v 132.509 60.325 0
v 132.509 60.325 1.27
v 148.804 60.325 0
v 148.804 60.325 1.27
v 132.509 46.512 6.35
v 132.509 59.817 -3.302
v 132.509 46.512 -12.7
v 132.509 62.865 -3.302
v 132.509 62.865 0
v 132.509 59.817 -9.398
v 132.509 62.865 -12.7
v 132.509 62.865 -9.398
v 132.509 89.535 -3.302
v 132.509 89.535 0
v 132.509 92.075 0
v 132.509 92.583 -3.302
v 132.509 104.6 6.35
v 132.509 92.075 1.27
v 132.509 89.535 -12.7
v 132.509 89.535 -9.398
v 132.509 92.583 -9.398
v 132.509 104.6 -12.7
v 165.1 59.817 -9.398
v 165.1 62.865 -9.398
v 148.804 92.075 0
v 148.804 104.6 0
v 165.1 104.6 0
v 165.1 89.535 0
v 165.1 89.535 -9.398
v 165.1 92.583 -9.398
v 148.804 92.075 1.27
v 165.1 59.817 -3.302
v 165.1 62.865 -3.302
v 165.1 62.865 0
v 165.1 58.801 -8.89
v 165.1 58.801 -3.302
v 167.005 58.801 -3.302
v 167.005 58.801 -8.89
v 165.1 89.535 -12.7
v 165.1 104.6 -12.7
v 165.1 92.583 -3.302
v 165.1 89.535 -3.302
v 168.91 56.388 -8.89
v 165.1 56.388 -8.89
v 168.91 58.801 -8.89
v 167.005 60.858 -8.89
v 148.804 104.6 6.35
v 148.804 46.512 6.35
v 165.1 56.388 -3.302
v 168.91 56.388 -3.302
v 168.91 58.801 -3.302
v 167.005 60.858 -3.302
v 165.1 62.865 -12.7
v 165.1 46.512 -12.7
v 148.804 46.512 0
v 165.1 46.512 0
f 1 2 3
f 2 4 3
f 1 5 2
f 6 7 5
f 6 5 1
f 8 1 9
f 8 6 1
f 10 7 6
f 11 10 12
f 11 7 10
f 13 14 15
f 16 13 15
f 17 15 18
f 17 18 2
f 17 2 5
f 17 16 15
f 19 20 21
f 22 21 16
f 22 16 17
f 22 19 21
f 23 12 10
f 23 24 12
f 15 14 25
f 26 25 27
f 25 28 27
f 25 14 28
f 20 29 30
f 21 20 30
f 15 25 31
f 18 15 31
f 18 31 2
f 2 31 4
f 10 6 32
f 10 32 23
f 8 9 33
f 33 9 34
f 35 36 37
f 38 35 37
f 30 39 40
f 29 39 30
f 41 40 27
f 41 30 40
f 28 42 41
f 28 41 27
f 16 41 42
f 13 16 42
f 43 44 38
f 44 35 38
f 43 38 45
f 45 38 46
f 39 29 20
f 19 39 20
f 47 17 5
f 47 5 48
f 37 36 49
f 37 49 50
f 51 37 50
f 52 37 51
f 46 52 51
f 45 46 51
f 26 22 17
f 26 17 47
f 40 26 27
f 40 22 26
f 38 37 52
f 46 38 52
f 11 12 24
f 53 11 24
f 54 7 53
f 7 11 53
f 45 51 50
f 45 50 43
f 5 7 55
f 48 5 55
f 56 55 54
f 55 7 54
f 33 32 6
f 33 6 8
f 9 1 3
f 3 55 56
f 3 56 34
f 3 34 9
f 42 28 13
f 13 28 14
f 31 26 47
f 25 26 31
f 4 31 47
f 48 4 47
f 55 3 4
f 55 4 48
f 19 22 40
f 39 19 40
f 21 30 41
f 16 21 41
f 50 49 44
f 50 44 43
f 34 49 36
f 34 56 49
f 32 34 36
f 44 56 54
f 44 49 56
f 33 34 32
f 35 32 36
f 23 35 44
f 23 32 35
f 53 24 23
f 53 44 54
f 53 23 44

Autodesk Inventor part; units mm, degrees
ref_plane "YZ Plane" through (0, 0, 0) normal (1, 0, 0) x (0, 1, 0)
ref_plane "XZ Plane" through (0, 0, 0) normal (0, 1, 0) x (-1, 0, 0)
sketch "Sketch1" plane through (0, 0, 0) normal (1, 0, 0) x (0, 1, 0)
  line L0 (0, 0) -> (228.6, 0)
  line L1 (228.6, 0) -> (228.6, -424.18)
  line L2 (228.6, -424.18) -> (0, -424.18)
  line L3 (0, -424.18) -> (0, 0)
  point P0 (0, 0)
  dimension "d0" = 424.18
  dimension "d1" = 228.6
extrude "Extrusion1" add sketch "Sketch1" along normal blind 165.1
sketch "Sketch2" plane through (165.1, 0, 0) normal (1, 0, 0) x (0, 0, -1)
  line L0 (0, 0) -> (424.18, 0) construction
  line L1 (12.7, 0) -> (411.48, 0)
  line L2 (411.48, 0) -> (411.48, 165.1)
  line L3 (411.48, 165.1) -> (12.7, 165.1)
  line L4 (12.7, 165.1) -> (12.7, 0)
  line L5 (0, 228.6) -> (0, 0) construction
  line L6 (424.18, 0) -> (424.18, 228.6) construction
  dimension "d4" = 398.78
  dimension "d5" = 165.1
  dimension "d6" = 12.7
  dimension "d7" = 12.7
extrude "Extrusion2" cut sketch "Sketch2" against normal blind 148.59
sketch "Sketch3" plane through (0, 0, 0) normal (0, 0, 1) x (1, 0, 0)
  line L0 (165.1, 228.6) -> (165.1, 0) projected
  line L1 (165.1, 89.535) -> (82.55, 89.535)
  line L2 (69.215, 89.535) -> (69.215, 62.865) construction
  line L3 (82.55, 62.865) -> (165.1, 62.865)
  line L4 (165.1, 62.865) -> (165.1, 89.535)
  line L5 (0, 0) -> (165.1, 0) projected
  arc A0 (82.55, 89.535) -> (82.55, 62.865) centre (82.55, 76.2) ccw
  dimension "d10" = 95.885
  dimension "d11" = 26.67
  dimension "d12" = 62.865
extrude "Extrusion3" cut sketch "Sketch3" against normal blind 457.2
sketch "Sketch4" plane through (0, 228.6, 0) normal (0, 1, 0) x (1, 0, 0)
  line L0 (165.1, 12.7) -> (165.1, 411.48) construction
  line L1 (165.1, 12.7) -> (16.51, 12.7) construction
  line L2 (16.51, 12.7) -> (16.51, 411.48) construction
  line L3 (165.1, 411.48) -> (16.51, 411.48) construction
  line L4 (0, 424.18) -> (165.1, 424.18) construction
  line L5 (0, 424.18) -> (165.1, 424.18) construction
  circle A0 centre (82.55, 353.06) radius 43.815
  line L6 (0, 0) -> (0, 424.18) construction
  circle A1 centre (82.55, 259.08) radius 43.815
  line L7 (0, 212.09) -> (165.1, 212.09) construction
  line L8 (165.1, 424.18) -> (165.1, 0) construction
  circle A2 centre (82.55, 71.12) radius 43.815
  circle A3 centre (82.55, 165.1) radius 43.815
  dimension "d15" = 87.63
  dimension "d16" = 82.55
  dimension "d17" = 58.42
  dimension "d18" = 87.63
  dimension "d19" = 93.98
  dimension "d20" = 82.55
extrude "Extrusion4" cut sketch "Sketch4" against normal blind 76.2
sketch "Sketch5" plane through (0, 228.6, 0) normal (0, 1, 0) x (1, 0, 0)
  circle A0 centre (82.55, 165.1) radius 43.815 projected
  circle A1 centre (82.55, 353.06) radius 43.815 projected
  circle A2 centre (82.55, 259.08) radius 43.815 projected
  circle A3 centre (82.55, 71.12) radius 43.815 projected
  line L0 (0, 0) -> (0, 424.18) projected
  line L1 (0, 0) -> (165.1, 0) projected
  line L2 (165.1, 424.18) -> (165.1, 0) projected
  line L3 (0, 424.18) -> (165.1, 424.18) projected
  point P0 (0, 0)
extrude "Extrusion5" add sketch "Sketch5" along normal blind 53.34
sketch "Sketch7" plane through (0, 0, 0) normal (-1, 0, 0) x (0, 0, 1)
  line L0 (0, 0) -> (0, 281.94) projected
  line L1 (-424.18, 281.94) -> (0, 281.94) projected
  line L2 (-424.18, 281.94) -> (-424.18, 0) projected
  line L3 (-424.18, 0) -> (0, 0) projected
  point P0 (0, 0)
extrude "Extrusion6" add sketch "Sketch7" along normal blind 19.05
sketch "Sketch8" plane through (16.51, 0, 0) normal (1, 0, 0) x (0, 0, -1)
  line L0 (411.48, 0) -> (12.7, 0) projected
  line L1 (411.48, 165.1) -> (411.48, 0) projected
  line L2 (12.7, 165.1) -> (411.48, 165.1) projected
  line L3 (12.7, 0) -> (12.7, 165.1) projected
  point P0 (0, 0)
extrude "Extrusion7" cut sketch "Sketch8" against normal blind 19.05
sketch "Sketch12" plane through (165.1, 0, 0) normal (1, 0, 0) x (0, 0, -1)
  line L0 (0, 89.535) -> (12.7, 89.535) construction
  line L1 (3.302, 89.535) -> (9.398, 89.535)
  line L2 (9.398, 89.535) -> (9.398, 92.583)
  line L3 (9.398, 92.583) -> (3.302, 92.583)
  line L4 (3.302, 92.583) -> (3.302, 89.535)
  line L5 (0, 89.535) -> (0, 281.94) construction
  line L6 (12.7, 89.535) -> (12.7, 62.865) construction
  line L7 (0, 89.535) -> (12.7, 89.535) construction
  line L8 (0, 62.865) -> (0, 89.535) construction
  line L9 (0, 62.865) -> (12.7, 62.865) construction
  line L10 (0, 62.865) -> (0, 89.535) construction
  line L11 (0, 76.2) -> (12.7, 76.2) construction
  line L12 (3.302, 62.865) -> (9.398, 62.865)
  line L13 (9.398, 62.865) -> (9.398, 59.817)
  line L14 (9.398, 59.817) -> (3.302, 59.817)
  line L15 (3.302, 59.817) -> (3.302, 62.865)
  point P0 (0, 0)
  dimension "d44" = 6.096
  dimension "d45" = 3.048
  dimension "d46" = 3.302
extrude "Extrusion11" cut sketch "Sketch12" against normal blind 82.55
sketch "Sketch13" plane through (-19.05, 0, 0) normal (0, -1, 0) x (1, 0, 0)
  line L0 (16.51, -12.7) -> (184.15, -12.7) projected
  line L1 (184.15, 0) -> (184.15, -12.7) projected
  line L2 (0, 0) -> (184.15, 0) projected
  line L3 (0, -424.18) -> (0, 0) projected
  line L4 (184.15, -424.18) -> (0, -424.18) projected
  line L5 (184.15, -411.48) -> (184.15, -424.18) projected
  line L6 (184.15, -411.48) -> (16.51, -411.48) projected
  line L7 (16.51, -411.48) -> (16.51, -12.7) projected
  point P0 (19.05, 0)
extrude "Extrusion12" add sketch "Sketch13" along normal blind 5.08
ref_plane "Work Plane1" through (82.55, 89.535, -212.09) normal (0, 0, 1) x (1, 0, 0)
mirror "Mirror1" about plane through (82.55, 89.535, -212.09) normal (0, 0, 1) of "Extrusion11"
sketch "Sketch15" plane through (165.1, 0, 0) normal (1, 0, 0) x (0, 0, -1)
  line L0 (3.302, 59.817) -> (8.89, 59.817)
  line L1 (8.89, 59.817) -> (8.89, 57.912)
  line L2 (8.89, 57.912) -> (3.302, 57.912)
  line L3 (3.302, 57.912) -> (3.302, 59.817)
  line L4 (9.398, 59.817) -> (3.302, 59.817) projected
  point P0 (0, 0)
  dimension "d55" = 5.588
  dimension "d56" = 1.905
extrude "Extrusion14" add sketch "Sketch15" along normal blind 3.81
sketch "Sketch17" plane through (165.1, 57.912, -3.302) normal (0, 0, 1) x (1, 0, 0)
  line L0 (0, 1.905) -> (3.81, 1.905) projected
  line L1 (3.81, 1.905) -> (0, 1.905)
  line L2 (0, 1.905) -> (0, 0.889)
  line L3 (0, 0.889) -> (3.81, 0.889)
  line L4 (3.81, 0.889) -> (3.81, 1.905)
  point P0 (-165.1, -57.912)
  dimension "d60" = 3.81
  dimension "d61" = 1.016
extrude "Extrusion15" cut sketch "Sketch17" against normal blind 25.4
sketch "Sketch18" plane through (165.1, 57.912, -3.302) normal (0, 0, 1) x (1, 0, 0)
  line L0 (0, 1.905) -> (-82.55, 1.905) construction
  line L1 (3.81, 0) -> (3.81, 0.889) projected
  line L2 (1.905, 2.9464) -> (3.81, 0.889)
  line L3 (3.81, 0.889) -> (1.905, 0.889)
  line L4 (1.905, 0.889) -> (1.905, 2.9464)
  line L5 (0, 4.953) -> (0, -62.992) projected
  point P0 (-165.1, -57.912)
  dimension "d64" = 1.905
  dimension "d65" = 2.0574
extrude "Extrusion16" add sketch "Sketch18" against normal blind 5.588
sketch "Sketch19" plane through (165.1, 57.912, -8.89) normal (0, -1, 0) x (1, 0, 0)
  line L0 (0, 0) -> (0, 5.588) projected
  line L1 (0, 0) -> (3.81, 0) projected
  line L2 (3.81, 5.588) -> (3.81, 0) projected
  line L3 (0, 5.588) -> (3.81, 5.588) projected
  point P0 (-165.1, 8.89)
extrude "Extrusion17" add sketch "Sketch19" along normal blind 1.524
mirror "Mirror2" about plane through (82.55, 89.535, -212.09) normal (0, 0, 1) of "Extrusion14", "Extrusion15", "Extrusion16", "Extrusion17"
sketch "Sketch21" plane through (82.55, 89.535, 0) normal (0, 0, 1) x (1, 0, 0)
  line L0 (49.9587, -43.0228) -> (93.9109, -43.0228)
  line L1 (93.9109, -43.0228) -> (93.9109, 15.0648)
  line L2 (93.9109, 15.0648) -> (49.9587, 15.0648)
  line L3 (49.9587, 15.0648) -> (49.9587, -43.0228)
  point P0 (-82.55, -89.535)
extrude "Extrusion18" cut sketch "Sketch21" against normal blind 25.4 keep common part
sketch "Sketch22" plane through (132.5087, 104.5998, 0) normal (0, 0, 1) x (1, 0, 0)
  line L0 (0, -58.0876) -> (32.5913, -58.0876) projected
  line L1 (0, 0) -> (16.2957, 0)
  line L2 (16.2957, 0) -> (16.2957, -58.0876)
  line L3 (16.2957, -58.0876) -> (0, -58.0876)
  line L4 (0, -58.0876) -> (0, 0)
  point P0 (-132.5087, -104.5998)
extrude "Extrusion19" add sketch "Sketch22" along normal blind 6.35
sketch "Sketch23" plane through (148.8043, 62.865, 0) normal (1, 0, 0) x (0, 0, -1)
  line L0 (0, 26.67) -> (0, 41.7348) projected
  line L1 (0, 29.21) -> (-1.27, 29.21)
  line L2 (-1.27, 29.21) -> (-1.27, -2.54)
  line L3 (-1.27, -2.54) -> (0, -2.54)
  line L4 (0, -2.54) -> (0, 29.21)
  line L5 (0, 26.67) -> (3.302, 26.67) projected
  line L6 (3.302, 0) -> (0, 0) projected
  point P0 (0, -62.865)
  dimension "d74" = 1.27
  dimension "d75" = 2.54
  dimension "d76" = 2.54
extrude "Extrusion20" cut sketch "Sketch23" against normal blind 25.4
sketch "Sketch9" plane through (0, 281.94, 0) normal (0, 1, 0) x (1, 0, 0)
  line L0 (146.05, 19.05) -> (146.05, 405.13)
  line L1 (0, 405.13) -> (0, 19.05)
  line L2 (165.1, 424.18) -> (-19.05, 424.18) construction
  line L3 (-19.05, 0) -> (-19.05, 424.18) construction
  line L4 (165.1, 0) -> (165.1, 424.18) construction
  line L5 (165.1, 0) -> (-19.05, 0) construction
  circle A0 centre (82.55, 71.12) radius 43.815 construction
  circle A1 centre (82.55, 259.08) radius 43.815 construction
  circle A2 centre (82.55, 353.06) radius 43.815 construction
  circle A3 centre (82.55, 165.1) radius 43.815 construction
  line L6 (165.1, 0) -> (-19.05, 0) construction
  line L7 (165.1, 0) -> (165.1, 424.18) construction
  line L8 (165.1, 424.18) -> (-19.05, 424.18) construction
  line L9 (-19.05, 0) -> (-19.05, 424.18) construction
  line L10 (146.05, 405.13) -> (117.7739, 405.13)
  line L11 (47.3261, 405.13) -> (0, 405.13)
  arc A4 (47.3261, 405.13) -> (40.7894, 306.07) centre (82.55, 353.06) ccw
  arc A5 (124.3106, 306.07) -> (117.7739, 405.13) centre (82.55, 353.06) ccw
  arc A6 (40.7894, 306.07) -> (40.7894, 212.09) centre (82.55, 259.08) ccw
  arc A7 (124.3106, 212.09) -> (107.2668, 316.8822) centre (82.55, 259.08) ccw
  arc A8 (40.7894, 212.09) -> (40.7894, 118.11) centre (82.55, 165.1) ccw
  arc A9 (124.3106, 118.11) -> (124.3106, 212.09) centre (82.55, 165.1) ccw
  line L12 (0, 19.05) -> (47.3261, 19.05)
  line L13 (117.7739, 19.05) -> (146.05, 19.05)
  arc A10 (40.7894, 118.11) -> (47.3261, 19.05) centre (82.55, 71.12) ccw
  arc A11 (117.7739, 19.05) -> (124.3106, 118.11) centre (82.55, 71.12) ccw
  point P0 (0, 0)
  dimension "d30" = 19.05
  dimension "d31" = 19.05
sketch "Sketch10" plane through (0, 281.94, -19.05) normal (1, 0, 0) x (0, 0, -1)
  line L0 (405.13, 0) -> (405.13, -281.94) projected
  line L1 (-19.05, 0) -> (405.13, 0) projected
  line L2 (405.13, -101.6) -> (-19.05, -101.6)
  line L3 (-19.05, -101.6) -> (-19.05, 0)
  line L4 (-19.05, 0) -> (405.13, 0)
  line L5 (405.13, 0) -> (405.13, -101.6)
  line L6 (0, 0) -> (386.08, 0) projected
  line L7 (0, 0) -> (0, -101.6) projected
  line L8 (0, -101.6) -> (386.08, -101.6) projected
  line L9 (386.08, 0) -> (386.08, -101.6) projected
  point P0 (-19.05, -281.94)
  dimension "d39" = 0
sketch "Sketch11" plane through (0, 281.94, 0) normal (0, 1, 0) x (1, 0, 0)
  circle A0 centre (82.55, 71.12) radius 43.815 construction
  line L0 (19.05, 19.05) -> (19.05, 0) projected
  line L1 (19.05, 0) -> (47.3261, 0)
  line L2 (47.3261, 0) -> (47.3261, 19.05)
  line L3 (47.3261, 19.05) -> (19.05, 19.05)
  line L4 (19.05, 19.05) -> (19.05, 0)
  line L5 (165.1, 424.18) -> (19.05, 424.18) projected
  line L6 (47.3261, 405.13) -> (19.05, 405.13)
  line L7 (19.05, 405.13) -> (19.05, 424.18)
  line L8 (19.05, 424.18) -> (47.3261, 424.18)
  line L9 (47.3261, 424.18) -> (47.3261, 405.13)
  point P0 (0, 0)
properties part number "EngineClipTestBlock"
